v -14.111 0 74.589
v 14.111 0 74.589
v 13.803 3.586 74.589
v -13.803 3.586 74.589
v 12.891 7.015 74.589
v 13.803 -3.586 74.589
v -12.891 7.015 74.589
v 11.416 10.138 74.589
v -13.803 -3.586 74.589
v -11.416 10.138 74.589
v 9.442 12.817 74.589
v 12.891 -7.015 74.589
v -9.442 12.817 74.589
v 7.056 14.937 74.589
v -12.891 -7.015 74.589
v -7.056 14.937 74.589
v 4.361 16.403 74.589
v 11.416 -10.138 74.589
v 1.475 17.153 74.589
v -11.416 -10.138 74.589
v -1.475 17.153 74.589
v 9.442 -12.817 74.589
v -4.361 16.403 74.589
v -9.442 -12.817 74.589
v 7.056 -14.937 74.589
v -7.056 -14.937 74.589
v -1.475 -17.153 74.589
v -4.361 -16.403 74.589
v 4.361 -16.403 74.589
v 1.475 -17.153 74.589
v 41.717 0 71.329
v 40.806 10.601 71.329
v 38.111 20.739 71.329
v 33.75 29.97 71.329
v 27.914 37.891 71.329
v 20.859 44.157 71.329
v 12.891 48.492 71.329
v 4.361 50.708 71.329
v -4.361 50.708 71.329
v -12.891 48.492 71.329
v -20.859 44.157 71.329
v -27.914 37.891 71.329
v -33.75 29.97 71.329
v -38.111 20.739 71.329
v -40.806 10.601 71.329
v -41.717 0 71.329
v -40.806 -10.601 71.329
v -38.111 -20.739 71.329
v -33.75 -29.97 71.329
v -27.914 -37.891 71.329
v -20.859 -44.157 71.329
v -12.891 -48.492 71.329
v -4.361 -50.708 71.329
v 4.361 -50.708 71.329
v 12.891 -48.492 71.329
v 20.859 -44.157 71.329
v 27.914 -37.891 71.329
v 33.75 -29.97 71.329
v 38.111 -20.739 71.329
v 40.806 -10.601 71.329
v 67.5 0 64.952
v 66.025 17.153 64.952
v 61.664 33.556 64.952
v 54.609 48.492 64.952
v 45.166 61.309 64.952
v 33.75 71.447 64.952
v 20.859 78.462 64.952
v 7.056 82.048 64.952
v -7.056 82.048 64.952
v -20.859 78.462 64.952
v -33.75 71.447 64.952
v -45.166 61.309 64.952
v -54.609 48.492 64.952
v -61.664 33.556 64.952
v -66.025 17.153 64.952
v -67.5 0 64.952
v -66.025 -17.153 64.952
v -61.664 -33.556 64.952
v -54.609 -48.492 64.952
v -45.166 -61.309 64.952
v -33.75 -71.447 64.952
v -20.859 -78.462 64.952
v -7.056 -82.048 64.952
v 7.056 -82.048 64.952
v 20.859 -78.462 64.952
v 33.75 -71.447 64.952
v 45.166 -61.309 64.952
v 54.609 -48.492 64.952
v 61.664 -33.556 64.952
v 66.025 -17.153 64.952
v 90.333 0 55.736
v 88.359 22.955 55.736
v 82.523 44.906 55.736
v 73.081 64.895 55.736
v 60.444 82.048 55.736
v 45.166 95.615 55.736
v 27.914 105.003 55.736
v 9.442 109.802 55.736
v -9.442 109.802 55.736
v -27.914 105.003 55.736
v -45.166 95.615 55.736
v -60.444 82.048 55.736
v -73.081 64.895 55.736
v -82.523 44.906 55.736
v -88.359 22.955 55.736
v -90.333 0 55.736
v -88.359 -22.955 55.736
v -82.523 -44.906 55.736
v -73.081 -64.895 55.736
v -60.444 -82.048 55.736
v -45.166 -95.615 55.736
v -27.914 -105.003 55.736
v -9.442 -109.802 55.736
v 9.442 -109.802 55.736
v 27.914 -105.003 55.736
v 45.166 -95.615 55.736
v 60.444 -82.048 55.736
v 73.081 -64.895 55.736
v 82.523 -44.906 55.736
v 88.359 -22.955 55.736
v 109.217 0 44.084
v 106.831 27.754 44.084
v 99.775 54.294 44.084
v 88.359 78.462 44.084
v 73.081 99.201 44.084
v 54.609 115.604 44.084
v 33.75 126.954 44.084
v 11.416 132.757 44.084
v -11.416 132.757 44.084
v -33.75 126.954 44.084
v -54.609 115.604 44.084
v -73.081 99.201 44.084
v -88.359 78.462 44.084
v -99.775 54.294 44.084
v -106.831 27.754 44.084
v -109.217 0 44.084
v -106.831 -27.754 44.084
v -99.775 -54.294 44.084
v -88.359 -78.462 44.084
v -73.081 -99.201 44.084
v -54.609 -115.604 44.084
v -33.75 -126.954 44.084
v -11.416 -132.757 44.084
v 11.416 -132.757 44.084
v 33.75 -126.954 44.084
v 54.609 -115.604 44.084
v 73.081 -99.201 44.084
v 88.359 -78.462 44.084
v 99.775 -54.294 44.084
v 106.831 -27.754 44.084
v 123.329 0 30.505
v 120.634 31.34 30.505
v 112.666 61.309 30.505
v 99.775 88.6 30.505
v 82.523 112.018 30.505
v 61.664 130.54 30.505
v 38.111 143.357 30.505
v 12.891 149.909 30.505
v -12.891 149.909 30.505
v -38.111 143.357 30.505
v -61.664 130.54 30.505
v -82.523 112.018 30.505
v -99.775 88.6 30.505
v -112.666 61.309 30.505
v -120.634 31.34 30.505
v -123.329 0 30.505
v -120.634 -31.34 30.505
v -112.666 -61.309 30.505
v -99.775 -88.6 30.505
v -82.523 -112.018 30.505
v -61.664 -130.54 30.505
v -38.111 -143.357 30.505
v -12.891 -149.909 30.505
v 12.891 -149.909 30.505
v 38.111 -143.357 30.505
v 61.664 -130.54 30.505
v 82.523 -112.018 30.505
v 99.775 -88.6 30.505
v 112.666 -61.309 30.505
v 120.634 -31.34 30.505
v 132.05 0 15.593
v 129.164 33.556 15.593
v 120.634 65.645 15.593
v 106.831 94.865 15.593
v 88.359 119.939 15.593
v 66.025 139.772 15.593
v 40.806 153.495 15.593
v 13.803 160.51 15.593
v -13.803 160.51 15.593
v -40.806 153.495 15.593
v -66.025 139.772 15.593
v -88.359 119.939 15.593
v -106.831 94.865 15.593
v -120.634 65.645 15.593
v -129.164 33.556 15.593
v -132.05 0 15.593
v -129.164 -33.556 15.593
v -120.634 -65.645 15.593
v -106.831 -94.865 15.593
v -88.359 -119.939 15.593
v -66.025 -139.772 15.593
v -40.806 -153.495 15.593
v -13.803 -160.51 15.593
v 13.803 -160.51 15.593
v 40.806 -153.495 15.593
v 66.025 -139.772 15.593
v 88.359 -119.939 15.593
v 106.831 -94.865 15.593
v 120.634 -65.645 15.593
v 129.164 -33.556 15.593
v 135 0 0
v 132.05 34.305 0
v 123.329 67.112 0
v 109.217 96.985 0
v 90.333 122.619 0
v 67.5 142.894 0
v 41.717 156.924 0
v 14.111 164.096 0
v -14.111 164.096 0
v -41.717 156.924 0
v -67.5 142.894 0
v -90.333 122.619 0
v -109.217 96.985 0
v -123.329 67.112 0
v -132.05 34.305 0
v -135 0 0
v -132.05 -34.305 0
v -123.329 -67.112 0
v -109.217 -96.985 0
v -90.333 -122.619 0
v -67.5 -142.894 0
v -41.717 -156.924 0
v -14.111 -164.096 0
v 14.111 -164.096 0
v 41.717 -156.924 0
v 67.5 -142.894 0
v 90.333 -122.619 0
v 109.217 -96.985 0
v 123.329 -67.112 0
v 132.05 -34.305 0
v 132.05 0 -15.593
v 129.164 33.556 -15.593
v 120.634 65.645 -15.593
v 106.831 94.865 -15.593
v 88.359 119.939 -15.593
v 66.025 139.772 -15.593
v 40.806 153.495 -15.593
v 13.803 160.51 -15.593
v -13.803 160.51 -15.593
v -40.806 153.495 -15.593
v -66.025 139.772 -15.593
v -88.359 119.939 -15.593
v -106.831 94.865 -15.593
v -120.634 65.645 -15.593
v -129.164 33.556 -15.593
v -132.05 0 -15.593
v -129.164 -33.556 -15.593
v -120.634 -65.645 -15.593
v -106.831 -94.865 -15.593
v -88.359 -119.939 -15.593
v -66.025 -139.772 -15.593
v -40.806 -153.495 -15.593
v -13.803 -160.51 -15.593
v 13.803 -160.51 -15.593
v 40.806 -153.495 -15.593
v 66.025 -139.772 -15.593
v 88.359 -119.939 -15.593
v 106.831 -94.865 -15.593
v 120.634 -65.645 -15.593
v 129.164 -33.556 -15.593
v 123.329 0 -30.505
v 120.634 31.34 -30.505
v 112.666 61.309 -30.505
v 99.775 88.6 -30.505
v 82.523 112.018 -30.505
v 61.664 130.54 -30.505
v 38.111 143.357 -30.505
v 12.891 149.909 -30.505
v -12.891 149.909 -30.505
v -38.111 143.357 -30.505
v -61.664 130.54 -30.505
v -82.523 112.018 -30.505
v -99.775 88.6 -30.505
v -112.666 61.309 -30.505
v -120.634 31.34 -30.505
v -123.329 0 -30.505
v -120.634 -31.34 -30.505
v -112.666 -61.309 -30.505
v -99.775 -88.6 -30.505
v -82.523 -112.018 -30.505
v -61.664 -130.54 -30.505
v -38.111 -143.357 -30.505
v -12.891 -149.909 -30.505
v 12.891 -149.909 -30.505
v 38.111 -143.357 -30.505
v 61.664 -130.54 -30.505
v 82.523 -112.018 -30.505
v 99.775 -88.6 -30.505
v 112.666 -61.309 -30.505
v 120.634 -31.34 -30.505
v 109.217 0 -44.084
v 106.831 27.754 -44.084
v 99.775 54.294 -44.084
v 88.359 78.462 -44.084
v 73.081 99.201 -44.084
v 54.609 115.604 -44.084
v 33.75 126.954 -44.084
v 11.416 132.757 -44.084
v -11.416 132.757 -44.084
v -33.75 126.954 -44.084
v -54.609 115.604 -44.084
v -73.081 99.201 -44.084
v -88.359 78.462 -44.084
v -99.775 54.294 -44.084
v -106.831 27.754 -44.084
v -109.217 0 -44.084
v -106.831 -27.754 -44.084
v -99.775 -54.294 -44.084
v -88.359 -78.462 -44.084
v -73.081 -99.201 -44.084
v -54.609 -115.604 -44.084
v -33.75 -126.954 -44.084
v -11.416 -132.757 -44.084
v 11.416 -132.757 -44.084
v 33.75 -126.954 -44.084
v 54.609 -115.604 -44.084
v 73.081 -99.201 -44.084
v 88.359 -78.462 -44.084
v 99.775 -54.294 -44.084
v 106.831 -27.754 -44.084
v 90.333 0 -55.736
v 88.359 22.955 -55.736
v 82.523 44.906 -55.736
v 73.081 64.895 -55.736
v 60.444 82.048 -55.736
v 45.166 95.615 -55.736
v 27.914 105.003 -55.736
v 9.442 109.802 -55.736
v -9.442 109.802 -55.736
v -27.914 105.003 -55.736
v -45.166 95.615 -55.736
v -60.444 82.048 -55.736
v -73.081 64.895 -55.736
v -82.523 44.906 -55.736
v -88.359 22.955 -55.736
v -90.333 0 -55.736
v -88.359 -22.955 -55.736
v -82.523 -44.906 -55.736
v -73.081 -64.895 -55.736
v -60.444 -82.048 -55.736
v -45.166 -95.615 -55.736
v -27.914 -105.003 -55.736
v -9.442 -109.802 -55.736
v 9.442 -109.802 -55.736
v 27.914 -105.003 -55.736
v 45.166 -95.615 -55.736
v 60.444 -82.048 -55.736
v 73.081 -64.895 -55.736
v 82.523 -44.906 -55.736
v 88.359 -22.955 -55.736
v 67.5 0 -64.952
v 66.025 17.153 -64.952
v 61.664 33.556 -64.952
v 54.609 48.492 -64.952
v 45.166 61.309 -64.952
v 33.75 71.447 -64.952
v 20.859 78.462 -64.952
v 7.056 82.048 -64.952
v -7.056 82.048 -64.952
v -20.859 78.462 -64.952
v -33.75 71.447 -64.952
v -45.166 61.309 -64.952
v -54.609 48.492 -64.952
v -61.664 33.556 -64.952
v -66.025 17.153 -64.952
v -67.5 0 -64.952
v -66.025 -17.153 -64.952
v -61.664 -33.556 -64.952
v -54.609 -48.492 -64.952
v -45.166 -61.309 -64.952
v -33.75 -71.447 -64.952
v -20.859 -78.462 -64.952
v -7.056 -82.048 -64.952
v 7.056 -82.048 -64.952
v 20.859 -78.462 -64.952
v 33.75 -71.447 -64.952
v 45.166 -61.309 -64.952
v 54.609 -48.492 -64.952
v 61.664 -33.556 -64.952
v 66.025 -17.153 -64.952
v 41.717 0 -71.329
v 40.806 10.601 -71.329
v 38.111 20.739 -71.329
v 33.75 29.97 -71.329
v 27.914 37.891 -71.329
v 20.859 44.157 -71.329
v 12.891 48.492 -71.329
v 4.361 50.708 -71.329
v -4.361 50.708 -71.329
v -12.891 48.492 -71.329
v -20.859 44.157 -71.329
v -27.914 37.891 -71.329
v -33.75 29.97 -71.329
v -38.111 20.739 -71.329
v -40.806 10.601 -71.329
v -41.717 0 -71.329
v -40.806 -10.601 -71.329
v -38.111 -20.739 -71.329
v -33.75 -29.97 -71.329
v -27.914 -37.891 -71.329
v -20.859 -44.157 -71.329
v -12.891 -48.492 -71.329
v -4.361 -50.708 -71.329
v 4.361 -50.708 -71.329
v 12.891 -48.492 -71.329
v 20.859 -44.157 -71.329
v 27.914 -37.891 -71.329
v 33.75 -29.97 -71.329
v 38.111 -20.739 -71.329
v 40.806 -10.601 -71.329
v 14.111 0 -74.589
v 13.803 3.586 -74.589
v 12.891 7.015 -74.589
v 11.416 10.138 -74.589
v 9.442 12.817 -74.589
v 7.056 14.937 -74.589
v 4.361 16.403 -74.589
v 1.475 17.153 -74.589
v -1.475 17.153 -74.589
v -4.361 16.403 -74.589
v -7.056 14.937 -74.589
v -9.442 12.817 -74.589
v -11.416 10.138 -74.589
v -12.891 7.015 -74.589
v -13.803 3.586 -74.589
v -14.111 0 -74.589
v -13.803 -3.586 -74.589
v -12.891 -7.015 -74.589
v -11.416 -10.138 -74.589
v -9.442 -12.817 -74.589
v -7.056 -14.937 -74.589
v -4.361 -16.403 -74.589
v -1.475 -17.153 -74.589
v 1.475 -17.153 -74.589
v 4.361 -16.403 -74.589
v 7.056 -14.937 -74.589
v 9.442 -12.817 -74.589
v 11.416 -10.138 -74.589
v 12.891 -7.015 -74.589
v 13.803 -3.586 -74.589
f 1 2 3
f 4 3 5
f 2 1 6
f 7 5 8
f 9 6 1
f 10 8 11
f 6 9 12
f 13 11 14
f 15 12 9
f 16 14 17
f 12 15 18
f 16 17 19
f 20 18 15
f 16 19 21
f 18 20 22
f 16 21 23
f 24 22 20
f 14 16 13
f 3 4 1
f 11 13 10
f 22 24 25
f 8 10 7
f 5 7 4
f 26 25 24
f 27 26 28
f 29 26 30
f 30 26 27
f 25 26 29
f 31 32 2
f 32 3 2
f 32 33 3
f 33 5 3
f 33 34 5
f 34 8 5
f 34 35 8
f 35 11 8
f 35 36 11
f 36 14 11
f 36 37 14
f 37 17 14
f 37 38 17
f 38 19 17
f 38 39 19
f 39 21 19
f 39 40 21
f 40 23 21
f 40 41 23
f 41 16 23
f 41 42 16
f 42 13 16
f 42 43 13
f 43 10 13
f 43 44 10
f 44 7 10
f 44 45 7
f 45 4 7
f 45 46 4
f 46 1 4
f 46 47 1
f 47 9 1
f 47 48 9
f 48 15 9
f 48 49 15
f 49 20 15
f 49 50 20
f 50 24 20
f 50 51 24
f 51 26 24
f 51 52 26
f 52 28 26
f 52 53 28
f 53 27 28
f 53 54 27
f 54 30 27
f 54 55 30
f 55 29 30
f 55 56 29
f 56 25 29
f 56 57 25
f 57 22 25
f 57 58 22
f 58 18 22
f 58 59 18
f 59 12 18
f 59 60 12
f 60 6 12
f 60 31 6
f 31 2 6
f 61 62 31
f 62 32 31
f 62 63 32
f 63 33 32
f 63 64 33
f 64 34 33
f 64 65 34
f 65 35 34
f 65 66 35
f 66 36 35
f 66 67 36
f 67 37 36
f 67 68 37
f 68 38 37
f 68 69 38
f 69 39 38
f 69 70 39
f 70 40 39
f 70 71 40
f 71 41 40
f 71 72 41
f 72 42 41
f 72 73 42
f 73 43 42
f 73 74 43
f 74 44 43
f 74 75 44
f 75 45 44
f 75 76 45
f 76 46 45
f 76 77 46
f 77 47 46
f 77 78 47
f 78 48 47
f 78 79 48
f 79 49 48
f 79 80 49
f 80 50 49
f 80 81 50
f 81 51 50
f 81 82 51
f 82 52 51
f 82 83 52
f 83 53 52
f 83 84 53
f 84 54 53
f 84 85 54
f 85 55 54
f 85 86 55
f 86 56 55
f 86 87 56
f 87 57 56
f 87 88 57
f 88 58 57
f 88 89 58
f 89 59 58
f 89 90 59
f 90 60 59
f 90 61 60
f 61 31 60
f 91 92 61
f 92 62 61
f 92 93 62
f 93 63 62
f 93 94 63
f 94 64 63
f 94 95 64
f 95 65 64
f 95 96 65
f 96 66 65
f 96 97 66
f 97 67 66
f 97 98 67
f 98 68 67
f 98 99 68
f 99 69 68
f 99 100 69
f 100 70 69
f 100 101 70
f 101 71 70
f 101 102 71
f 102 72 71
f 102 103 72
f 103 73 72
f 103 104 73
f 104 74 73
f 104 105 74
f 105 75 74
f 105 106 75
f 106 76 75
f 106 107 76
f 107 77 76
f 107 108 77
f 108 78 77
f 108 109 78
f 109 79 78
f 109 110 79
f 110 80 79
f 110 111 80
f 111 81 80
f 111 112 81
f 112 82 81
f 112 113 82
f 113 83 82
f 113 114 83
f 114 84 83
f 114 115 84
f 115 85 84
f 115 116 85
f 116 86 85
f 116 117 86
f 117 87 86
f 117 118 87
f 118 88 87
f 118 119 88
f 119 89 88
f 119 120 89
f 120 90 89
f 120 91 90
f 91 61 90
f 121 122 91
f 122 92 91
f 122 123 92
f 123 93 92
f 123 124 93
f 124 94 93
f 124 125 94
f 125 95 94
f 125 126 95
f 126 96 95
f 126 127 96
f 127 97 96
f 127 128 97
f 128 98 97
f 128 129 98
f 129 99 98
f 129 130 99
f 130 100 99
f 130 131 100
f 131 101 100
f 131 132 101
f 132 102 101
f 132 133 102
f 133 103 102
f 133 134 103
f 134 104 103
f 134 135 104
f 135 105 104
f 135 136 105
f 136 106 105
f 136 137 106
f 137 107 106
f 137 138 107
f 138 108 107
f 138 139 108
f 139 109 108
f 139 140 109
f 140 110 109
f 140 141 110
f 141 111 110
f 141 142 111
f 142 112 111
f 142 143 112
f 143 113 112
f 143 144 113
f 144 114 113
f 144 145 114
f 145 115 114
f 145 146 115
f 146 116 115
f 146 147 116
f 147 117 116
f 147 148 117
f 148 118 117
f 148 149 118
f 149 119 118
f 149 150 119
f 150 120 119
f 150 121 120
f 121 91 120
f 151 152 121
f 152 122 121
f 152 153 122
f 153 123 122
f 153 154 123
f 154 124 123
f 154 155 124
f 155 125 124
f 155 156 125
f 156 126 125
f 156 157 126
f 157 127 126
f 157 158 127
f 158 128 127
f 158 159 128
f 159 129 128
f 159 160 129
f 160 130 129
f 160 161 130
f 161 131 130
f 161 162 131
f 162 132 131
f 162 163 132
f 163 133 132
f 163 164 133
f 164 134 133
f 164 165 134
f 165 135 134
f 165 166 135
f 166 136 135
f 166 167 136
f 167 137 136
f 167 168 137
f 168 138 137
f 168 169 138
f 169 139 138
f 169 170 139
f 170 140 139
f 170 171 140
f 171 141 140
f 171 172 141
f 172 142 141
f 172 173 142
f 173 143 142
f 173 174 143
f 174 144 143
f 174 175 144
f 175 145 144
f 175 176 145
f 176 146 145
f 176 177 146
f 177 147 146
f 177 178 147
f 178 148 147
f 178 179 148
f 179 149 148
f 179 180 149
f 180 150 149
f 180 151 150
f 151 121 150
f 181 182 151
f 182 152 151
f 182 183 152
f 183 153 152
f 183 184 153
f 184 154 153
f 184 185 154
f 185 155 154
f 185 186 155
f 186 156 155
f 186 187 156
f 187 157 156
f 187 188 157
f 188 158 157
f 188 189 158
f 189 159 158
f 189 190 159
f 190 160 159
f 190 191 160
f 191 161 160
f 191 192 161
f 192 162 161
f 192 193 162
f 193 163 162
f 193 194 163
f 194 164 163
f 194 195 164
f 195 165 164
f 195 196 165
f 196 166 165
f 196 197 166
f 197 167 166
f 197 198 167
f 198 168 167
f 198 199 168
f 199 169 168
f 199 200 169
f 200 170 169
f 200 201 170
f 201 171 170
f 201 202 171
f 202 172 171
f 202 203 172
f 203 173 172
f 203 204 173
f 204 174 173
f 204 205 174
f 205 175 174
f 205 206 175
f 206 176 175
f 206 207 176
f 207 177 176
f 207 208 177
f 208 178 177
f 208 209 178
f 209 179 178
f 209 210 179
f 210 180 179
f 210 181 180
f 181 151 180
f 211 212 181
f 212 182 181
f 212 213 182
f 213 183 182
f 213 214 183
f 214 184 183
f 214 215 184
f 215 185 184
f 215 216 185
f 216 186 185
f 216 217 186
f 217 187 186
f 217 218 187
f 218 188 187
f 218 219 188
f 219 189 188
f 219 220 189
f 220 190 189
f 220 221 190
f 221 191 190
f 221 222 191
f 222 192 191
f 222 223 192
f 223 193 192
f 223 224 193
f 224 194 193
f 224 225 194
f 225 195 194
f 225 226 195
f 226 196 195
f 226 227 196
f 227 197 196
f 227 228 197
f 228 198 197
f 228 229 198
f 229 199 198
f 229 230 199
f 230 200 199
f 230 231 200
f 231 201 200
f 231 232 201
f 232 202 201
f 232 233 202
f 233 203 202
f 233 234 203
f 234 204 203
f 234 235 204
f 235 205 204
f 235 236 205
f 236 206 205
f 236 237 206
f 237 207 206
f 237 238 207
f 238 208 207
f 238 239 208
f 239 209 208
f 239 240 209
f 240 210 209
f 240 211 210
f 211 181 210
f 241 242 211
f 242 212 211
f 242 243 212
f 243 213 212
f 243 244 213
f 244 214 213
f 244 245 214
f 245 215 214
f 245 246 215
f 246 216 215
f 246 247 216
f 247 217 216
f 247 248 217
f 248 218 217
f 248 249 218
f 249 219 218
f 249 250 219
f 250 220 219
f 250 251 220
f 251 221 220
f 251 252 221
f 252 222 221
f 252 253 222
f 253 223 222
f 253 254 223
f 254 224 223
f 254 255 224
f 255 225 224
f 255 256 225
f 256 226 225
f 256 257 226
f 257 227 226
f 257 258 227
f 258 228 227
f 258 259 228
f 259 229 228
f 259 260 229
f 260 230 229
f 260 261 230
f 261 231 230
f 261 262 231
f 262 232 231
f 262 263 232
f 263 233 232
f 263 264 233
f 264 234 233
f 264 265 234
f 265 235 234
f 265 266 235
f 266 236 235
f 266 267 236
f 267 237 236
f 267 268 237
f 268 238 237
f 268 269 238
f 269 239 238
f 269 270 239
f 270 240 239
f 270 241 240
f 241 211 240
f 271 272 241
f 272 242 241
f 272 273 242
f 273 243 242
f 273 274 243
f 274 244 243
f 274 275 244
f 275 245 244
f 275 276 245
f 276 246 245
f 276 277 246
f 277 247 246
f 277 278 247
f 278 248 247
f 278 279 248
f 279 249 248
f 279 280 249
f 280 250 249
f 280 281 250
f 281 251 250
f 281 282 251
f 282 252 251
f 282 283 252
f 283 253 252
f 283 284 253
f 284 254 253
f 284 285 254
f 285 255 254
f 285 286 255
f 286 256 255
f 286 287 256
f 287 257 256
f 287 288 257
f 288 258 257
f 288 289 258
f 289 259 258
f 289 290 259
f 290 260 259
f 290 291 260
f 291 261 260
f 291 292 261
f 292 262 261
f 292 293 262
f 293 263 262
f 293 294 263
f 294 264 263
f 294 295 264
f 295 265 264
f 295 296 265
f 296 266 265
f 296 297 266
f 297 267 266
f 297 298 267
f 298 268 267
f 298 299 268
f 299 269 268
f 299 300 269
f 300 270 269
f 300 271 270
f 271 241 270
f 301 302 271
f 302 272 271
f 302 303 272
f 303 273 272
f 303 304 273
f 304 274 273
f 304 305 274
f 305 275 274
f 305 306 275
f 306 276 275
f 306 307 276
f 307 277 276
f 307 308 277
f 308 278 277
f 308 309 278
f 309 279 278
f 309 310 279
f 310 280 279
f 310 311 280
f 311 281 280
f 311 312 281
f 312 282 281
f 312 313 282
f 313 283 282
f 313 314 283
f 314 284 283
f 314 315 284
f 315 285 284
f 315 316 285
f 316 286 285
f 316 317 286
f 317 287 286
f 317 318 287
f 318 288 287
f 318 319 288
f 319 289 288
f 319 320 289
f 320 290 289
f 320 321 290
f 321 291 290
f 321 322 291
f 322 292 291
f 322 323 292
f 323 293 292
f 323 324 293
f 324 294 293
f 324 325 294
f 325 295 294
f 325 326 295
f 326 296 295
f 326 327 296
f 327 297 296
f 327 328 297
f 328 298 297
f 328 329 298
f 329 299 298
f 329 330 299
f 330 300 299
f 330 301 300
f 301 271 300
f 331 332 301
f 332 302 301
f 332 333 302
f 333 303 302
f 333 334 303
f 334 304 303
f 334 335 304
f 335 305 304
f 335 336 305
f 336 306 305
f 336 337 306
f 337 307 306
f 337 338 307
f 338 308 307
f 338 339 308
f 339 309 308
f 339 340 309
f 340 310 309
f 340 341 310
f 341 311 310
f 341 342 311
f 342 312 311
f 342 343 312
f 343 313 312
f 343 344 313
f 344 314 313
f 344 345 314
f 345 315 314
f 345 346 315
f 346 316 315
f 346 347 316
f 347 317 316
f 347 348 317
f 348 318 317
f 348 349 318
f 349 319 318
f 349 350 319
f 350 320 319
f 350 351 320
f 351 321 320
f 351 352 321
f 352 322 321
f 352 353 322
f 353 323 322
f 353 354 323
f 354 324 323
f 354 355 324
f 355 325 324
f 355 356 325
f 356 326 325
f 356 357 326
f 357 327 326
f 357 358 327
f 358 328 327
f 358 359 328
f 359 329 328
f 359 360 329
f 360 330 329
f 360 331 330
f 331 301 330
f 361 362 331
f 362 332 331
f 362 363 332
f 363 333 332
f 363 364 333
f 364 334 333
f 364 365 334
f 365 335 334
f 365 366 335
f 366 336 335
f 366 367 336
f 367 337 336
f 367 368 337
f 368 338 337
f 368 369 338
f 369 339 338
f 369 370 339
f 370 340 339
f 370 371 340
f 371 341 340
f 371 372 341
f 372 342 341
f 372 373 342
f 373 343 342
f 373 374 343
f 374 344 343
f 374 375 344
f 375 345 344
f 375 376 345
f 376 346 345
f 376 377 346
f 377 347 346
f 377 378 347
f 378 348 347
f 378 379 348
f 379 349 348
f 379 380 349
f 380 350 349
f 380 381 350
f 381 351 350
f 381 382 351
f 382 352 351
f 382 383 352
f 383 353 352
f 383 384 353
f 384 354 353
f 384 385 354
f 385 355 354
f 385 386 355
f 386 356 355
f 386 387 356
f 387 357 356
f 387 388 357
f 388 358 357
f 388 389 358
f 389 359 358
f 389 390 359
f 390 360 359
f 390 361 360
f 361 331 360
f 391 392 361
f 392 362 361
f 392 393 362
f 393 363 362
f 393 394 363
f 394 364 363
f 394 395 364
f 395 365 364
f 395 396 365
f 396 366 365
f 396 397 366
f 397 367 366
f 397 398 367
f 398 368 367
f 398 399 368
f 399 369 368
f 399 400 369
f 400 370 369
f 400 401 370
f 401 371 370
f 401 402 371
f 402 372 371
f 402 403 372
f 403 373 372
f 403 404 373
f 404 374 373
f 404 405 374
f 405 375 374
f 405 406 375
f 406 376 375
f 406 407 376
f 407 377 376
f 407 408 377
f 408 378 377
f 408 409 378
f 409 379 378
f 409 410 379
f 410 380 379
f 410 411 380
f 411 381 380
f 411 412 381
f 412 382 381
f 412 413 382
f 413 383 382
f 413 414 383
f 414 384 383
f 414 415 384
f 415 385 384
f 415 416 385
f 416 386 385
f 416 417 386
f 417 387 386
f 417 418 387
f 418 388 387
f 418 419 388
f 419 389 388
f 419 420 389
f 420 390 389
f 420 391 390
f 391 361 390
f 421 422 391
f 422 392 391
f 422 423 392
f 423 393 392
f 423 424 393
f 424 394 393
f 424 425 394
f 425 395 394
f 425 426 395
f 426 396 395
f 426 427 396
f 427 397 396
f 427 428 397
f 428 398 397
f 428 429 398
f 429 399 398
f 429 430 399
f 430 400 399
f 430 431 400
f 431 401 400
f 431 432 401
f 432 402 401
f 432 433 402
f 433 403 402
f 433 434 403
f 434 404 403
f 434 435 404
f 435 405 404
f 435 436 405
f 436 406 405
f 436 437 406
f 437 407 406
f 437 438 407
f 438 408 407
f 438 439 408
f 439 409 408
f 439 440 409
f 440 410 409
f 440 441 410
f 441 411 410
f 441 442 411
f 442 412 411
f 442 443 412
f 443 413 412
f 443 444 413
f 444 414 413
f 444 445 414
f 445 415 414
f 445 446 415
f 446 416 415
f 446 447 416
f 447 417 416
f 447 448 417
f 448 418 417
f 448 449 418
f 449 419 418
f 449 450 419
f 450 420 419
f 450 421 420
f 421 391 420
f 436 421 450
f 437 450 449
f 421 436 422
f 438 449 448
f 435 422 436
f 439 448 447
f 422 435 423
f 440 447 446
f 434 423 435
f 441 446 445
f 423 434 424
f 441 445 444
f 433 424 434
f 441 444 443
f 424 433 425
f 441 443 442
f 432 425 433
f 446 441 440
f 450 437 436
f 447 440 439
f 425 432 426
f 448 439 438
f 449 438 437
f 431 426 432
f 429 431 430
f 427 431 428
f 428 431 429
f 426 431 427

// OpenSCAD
// Generated by SolidPython 1.0.1 on 2020-07-29 00:46:48


scale(v = [9, 11, 5]) {
	sphere(r = 15);
}
/***********************************************
*********      SolidPython code:      **********
************************************************
 
# import packages: SolidPython
from solid import *
from solid.utils import *
from itertools import chain, combinations, permutations


class Resize:

    def __init__(self, scad_file):
        self.scad_file = scad_file
        #self.scad_file = import_scad(scad_file)
        # cone/cylinder param:
        self.r1 = 0
        self.r2 = 0
        self.h = 0
        # rectangular prism param:
        self.w = 0
        self.l = 0
        # ellipse param:
        self.r = 0

    # import OpenScad code (file name corresponds to shape)


    # classify shape + parameters
    def assign(self, param1, param2, param3):
        if self.scad_file == 'cone.scad':
            self.r1 = param1
            self.r2 = param2
            self.h = param3
        elif self.scad_file == 'cylinder.scad':
            self.r1 = param1
            self.r2 = param2
            self.h = param3
        elif self.scad_file == 'rectangularPrism.scad':
            self.h = param1
            self.l = param2
            self.w = param3
        else:
            self.r = param1
            self.h = param2

    # resize parameters
    def iterate(self):
        x = range(3, 20, 2)
        i = 1
        if self.scad_file == 'cone.scad':
            tempList = list(permutations(x, 2))
            for temp in tempList:
                param1 = temp[0]
                param2 = temp[1]
                filepath = 'produced_scad_files/' + 'cone' + str(param1) + '_' + str(param2) + '_' + '.scad'
                scad_render_to_file(cylinder(h=param1, r1=param2, r2=0), filepath)

        elif self.scad_file == 'cylinder.scad':
            tempList = list(permutations(x, 3))
            for temp in tempList:
                param1 = temp[0]
                param2 = temp[1]
                filepath = 'produced_scad_files/' + 'cylinder' + str(param1) + '_' + str(param2) + '_' + '.scad'
                scad_render_to_file(cylinder(h=param1, r1=param2, r2=param2), filepath)

        elif self.scad_file == 'rectangularPrism.scad':
            tempList = list(permutations(x, 3))
            for temp in tempList:
                param1 = temp[0]
                param2 = temp[1]
                param3 = temp[2]
                filepath = 'produced_scad_files/' + 'rectangularPrism' + str(param1) + '_' + str(param2) + '_' + str(
                    param3) + '.scad'
                scad_render_to_file(cube(size=(param1, param2, param3)), filepath)

        elif self.scad_file == 'ellipse.scad':
            tempList = list(permutations(x, 4))
            for temp in tempList:
                param1 = temp[0]
                param2 = temp[1]
                param3 = temp[2]
                param4 = temp[3]
                filepath = 'produced_scad_files/' + 'ellipse' + str(param1) + '_' + str(param2) + '_' + str(param3) + '_' + str(param4) + '.scad'
                scad_render_to_file(scale([param1, param2, param3])(sphere(r=param4)), filepath)

    def render_to_scadfile(self):
        scad_render_to_file(scad, 'example.scad') 
 
************************************************/
